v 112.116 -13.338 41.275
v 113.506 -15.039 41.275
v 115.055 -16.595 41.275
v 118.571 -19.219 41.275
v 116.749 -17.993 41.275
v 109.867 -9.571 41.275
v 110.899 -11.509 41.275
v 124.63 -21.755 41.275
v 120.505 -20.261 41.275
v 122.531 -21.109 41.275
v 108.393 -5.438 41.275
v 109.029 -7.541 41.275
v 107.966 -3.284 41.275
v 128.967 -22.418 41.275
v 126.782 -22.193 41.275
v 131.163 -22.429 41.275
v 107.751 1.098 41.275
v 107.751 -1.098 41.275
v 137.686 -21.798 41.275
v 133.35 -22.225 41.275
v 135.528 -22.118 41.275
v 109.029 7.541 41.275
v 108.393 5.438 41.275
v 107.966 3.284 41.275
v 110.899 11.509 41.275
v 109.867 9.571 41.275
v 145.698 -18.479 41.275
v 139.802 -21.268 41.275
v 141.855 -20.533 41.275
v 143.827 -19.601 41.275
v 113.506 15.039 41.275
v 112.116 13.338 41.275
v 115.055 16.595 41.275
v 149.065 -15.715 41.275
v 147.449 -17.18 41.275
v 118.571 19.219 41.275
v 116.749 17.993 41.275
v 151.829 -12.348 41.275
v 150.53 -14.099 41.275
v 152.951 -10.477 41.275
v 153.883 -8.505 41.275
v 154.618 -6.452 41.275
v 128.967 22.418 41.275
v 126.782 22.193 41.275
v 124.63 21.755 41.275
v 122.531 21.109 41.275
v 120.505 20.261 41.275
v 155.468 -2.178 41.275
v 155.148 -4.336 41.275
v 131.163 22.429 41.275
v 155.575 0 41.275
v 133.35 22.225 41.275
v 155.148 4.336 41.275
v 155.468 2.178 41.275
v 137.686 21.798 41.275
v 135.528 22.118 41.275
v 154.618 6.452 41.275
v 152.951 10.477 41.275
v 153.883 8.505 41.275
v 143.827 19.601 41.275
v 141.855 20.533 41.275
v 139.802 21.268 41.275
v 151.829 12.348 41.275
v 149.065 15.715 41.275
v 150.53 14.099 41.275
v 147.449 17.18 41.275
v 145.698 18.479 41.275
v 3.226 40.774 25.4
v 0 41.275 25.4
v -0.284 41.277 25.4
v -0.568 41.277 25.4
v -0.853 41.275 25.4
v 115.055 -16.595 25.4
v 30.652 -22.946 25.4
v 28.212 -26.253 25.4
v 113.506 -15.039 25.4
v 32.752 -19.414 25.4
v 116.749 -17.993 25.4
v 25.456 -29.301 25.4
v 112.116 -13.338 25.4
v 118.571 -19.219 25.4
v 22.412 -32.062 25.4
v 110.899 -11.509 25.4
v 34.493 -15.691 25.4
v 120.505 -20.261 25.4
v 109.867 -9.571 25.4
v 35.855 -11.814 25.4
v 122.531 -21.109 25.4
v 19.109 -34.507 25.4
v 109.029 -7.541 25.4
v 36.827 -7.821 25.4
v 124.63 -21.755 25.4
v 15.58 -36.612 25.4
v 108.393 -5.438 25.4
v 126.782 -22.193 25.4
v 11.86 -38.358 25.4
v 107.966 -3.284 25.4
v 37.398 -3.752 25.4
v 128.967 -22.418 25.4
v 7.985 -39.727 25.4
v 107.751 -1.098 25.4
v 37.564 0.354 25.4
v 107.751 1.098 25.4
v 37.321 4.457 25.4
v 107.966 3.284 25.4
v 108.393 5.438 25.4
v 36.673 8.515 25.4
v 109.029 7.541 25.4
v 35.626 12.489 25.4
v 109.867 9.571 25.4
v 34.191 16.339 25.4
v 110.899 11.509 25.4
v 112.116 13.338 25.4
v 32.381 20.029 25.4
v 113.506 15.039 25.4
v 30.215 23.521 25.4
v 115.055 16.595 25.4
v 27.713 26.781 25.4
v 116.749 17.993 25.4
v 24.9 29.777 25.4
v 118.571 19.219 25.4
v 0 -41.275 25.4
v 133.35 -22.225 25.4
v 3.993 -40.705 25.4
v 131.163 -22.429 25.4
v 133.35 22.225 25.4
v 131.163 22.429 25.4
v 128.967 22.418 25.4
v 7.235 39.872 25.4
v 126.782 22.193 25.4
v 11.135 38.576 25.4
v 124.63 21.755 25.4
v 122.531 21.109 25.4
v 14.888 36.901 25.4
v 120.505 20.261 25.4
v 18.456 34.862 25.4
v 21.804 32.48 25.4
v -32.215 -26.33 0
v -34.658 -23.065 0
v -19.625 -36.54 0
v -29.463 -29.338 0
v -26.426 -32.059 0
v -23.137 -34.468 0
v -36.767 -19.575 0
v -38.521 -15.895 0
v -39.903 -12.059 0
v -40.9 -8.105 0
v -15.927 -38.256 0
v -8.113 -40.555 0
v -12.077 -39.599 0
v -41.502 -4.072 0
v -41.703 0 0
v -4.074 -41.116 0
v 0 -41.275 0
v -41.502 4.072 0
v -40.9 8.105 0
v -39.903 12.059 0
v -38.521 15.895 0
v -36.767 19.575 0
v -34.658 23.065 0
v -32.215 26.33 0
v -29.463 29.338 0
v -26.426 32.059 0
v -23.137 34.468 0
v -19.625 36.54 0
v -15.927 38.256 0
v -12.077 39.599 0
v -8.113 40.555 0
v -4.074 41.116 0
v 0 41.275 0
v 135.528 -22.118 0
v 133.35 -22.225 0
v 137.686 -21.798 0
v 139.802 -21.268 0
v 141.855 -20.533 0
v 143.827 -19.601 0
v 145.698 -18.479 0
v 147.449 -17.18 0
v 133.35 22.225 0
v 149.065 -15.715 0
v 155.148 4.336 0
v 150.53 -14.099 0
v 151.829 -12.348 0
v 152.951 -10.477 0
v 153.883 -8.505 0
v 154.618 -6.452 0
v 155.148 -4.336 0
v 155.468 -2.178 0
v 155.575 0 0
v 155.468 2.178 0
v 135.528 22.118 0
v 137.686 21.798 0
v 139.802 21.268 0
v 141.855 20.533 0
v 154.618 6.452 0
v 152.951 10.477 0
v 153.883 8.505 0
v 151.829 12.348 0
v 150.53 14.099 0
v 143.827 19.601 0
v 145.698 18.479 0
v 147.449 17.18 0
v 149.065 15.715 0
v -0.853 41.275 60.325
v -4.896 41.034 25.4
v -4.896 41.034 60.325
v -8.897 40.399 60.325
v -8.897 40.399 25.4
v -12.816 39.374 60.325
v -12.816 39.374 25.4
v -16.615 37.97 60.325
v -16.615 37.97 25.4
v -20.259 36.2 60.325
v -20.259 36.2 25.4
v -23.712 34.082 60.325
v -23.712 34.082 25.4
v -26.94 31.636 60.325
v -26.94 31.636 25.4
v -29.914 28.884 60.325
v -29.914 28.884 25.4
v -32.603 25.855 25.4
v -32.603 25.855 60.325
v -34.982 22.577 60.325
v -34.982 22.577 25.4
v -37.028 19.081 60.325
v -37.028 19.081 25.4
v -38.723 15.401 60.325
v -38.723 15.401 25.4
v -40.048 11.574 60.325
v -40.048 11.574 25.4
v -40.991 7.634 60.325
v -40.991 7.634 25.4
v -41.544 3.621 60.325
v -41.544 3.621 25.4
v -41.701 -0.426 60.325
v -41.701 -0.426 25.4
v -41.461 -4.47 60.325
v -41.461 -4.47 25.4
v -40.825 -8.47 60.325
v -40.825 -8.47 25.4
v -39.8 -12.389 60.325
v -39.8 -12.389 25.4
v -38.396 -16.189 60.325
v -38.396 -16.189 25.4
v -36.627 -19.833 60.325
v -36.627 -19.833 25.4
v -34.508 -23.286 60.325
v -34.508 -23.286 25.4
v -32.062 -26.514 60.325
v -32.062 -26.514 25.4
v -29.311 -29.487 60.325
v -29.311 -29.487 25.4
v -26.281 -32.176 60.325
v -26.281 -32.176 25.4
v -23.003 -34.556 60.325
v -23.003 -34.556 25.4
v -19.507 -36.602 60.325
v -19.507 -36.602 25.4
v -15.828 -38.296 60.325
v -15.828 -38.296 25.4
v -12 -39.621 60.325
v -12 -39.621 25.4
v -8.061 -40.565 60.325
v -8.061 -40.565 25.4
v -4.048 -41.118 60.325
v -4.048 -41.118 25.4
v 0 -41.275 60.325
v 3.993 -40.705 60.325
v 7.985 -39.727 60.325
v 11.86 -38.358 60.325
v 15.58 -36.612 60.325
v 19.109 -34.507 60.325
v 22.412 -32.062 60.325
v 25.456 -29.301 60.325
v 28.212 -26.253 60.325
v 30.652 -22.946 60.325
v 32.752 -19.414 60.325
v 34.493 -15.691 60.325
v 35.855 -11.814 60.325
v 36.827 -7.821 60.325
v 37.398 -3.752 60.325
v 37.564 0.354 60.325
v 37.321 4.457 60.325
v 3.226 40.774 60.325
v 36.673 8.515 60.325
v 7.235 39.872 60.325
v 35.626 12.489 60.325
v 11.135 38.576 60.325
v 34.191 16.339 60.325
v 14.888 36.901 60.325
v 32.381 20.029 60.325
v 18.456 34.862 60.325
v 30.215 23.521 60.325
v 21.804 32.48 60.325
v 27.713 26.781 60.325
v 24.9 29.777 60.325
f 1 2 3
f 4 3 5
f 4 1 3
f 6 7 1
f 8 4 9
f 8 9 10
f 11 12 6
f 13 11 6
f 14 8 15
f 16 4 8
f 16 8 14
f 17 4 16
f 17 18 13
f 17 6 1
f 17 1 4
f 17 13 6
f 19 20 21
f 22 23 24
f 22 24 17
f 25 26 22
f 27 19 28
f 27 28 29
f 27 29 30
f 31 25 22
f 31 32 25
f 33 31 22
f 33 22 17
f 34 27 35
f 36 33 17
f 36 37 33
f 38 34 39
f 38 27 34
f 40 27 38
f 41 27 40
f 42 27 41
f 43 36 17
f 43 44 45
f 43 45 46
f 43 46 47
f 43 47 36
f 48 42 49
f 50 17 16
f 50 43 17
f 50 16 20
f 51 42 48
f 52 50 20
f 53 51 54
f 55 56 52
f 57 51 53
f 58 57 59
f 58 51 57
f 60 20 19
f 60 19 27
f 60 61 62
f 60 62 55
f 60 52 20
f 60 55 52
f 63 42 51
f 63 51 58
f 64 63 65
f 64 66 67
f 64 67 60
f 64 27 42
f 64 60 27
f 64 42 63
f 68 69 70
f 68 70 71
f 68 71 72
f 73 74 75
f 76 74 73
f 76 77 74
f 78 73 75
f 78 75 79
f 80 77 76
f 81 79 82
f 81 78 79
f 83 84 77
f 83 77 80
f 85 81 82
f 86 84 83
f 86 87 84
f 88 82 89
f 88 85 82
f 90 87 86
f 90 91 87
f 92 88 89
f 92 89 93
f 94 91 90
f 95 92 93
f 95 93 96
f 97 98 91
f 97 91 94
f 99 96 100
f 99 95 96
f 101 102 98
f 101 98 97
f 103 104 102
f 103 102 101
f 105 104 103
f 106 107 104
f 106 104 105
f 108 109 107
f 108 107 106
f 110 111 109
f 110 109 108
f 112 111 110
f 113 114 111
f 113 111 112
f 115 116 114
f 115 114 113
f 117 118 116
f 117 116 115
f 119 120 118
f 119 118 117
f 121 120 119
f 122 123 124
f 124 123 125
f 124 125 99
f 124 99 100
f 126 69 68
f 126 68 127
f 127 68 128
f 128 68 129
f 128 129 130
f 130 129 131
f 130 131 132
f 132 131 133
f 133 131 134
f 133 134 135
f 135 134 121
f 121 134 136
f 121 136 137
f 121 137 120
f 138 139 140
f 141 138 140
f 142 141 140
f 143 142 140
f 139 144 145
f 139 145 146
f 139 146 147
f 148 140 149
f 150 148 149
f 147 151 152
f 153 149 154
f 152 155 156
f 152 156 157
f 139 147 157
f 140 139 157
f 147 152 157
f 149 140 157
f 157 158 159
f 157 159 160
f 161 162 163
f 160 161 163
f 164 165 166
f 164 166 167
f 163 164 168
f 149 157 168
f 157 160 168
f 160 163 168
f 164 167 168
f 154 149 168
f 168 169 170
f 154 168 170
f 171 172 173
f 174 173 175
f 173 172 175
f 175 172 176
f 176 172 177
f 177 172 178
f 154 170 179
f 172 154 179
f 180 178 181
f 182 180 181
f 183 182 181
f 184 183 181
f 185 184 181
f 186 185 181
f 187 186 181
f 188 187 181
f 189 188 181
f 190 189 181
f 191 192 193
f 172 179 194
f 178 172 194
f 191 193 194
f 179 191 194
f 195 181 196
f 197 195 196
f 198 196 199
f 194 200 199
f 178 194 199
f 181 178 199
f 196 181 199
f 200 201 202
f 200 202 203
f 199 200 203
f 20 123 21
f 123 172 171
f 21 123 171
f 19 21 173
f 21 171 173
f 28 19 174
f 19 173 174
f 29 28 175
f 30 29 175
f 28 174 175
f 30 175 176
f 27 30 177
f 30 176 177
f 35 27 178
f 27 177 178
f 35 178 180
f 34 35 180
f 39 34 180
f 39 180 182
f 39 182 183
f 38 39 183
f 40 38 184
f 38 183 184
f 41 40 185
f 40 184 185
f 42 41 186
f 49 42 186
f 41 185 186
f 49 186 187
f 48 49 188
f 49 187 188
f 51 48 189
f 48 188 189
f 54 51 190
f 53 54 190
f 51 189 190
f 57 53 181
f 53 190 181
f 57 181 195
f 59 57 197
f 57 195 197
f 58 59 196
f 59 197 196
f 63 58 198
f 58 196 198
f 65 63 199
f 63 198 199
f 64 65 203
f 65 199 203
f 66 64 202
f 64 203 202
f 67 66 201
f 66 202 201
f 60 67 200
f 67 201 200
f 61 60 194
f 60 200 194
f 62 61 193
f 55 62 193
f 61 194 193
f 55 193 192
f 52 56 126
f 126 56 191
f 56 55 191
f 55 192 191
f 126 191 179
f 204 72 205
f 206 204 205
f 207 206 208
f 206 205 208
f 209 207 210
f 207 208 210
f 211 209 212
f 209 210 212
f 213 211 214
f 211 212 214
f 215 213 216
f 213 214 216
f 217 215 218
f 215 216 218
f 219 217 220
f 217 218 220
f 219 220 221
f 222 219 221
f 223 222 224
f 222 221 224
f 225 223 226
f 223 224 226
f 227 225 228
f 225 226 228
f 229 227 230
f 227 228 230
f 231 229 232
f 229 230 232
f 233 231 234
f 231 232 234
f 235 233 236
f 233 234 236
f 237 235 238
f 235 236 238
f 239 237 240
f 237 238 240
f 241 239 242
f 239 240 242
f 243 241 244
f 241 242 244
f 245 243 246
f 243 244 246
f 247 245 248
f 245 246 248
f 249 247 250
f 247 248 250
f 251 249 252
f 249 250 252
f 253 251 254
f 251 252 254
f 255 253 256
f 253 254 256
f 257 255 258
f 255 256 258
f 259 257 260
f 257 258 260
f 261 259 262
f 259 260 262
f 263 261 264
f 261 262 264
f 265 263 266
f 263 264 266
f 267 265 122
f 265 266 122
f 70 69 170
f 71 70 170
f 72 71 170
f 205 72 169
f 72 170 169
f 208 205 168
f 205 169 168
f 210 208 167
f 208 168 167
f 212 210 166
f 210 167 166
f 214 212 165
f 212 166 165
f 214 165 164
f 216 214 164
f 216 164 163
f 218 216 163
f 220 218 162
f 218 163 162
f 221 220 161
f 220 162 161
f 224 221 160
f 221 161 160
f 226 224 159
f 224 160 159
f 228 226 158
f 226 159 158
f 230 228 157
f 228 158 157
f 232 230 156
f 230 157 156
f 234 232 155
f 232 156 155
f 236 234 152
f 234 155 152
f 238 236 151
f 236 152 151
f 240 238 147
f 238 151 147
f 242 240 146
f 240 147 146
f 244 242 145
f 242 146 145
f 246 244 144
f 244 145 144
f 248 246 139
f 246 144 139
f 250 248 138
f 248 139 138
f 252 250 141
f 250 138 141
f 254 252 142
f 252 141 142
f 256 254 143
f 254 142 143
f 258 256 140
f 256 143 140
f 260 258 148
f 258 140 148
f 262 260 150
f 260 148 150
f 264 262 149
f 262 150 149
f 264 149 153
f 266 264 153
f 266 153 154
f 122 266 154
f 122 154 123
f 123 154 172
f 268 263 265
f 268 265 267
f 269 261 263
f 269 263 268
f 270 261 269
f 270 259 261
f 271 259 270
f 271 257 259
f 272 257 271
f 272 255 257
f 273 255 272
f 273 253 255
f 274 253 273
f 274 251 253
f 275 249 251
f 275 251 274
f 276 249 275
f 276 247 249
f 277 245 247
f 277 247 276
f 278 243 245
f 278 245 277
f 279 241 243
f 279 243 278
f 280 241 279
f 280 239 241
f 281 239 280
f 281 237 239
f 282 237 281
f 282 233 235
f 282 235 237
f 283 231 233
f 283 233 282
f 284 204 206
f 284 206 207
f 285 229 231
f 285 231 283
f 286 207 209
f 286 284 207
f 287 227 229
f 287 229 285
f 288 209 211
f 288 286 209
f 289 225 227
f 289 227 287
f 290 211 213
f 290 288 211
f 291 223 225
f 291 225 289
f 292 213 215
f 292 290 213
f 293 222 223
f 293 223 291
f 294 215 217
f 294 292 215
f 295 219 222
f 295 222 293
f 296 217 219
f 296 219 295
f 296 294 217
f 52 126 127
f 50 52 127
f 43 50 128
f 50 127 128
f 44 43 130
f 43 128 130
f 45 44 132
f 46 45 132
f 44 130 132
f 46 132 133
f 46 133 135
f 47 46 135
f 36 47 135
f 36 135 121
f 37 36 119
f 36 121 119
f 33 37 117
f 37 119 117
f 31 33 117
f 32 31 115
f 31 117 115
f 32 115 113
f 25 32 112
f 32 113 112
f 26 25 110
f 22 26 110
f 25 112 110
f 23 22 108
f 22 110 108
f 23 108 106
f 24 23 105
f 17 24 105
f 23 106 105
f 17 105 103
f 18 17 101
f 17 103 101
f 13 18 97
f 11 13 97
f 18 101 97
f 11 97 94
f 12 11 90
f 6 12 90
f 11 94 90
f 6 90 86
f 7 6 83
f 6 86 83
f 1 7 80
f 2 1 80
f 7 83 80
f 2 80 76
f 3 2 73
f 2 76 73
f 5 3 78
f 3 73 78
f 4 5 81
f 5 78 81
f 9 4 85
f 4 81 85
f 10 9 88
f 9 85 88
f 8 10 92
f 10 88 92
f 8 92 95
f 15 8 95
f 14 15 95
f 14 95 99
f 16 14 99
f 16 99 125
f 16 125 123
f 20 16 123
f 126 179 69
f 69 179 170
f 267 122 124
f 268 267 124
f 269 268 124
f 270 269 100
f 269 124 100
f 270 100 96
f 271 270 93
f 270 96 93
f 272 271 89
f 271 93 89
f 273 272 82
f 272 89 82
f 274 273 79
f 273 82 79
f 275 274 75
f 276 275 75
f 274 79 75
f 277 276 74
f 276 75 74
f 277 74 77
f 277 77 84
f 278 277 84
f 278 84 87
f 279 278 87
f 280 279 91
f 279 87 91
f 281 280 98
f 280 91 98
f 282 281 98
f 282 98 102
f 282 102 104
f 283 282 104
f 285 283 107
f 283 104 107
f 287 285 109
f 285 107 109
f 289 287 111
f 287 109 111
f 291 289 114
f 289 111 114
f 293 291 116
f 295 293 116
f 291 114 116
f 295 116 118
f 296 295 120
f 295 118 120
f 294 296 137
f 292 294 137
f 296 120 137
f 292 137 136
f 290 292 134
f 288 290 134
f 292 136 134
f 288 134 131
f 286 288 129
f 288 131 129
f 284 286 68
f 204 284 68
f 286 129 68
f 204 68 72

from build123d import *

# Parameters (mm, degrees)
F2_DEPTH = 25.4
F4_DEPTH = 34.925
F6_DEPTH = 15.875


with BuildPart() as f2:
    # F0 (on Top) → F2 (new body)
    with BuildSketch(Plane.XY):
        with BuildLine():
            Line((133.35, 22.225), (0, 41.275))
            ThreePointArc((0, 41.275), (-41.703462, 0), (0, -41.275))
            Line((0, -41.275), (133.35, -22.225))
            ThreePointArc((133.35, -22.225), (155.575, 0), (133.35, 22.225))
        make_face()
    extrude(amount=F2_DEPTH)

    # F3 (on face) → F4 (join)
    with BuildSketch(Plane.XY.offset(25.4)):
        with BuildLine():
            ThreePointArc((-0.852523, 41.275), (-41.701261, -0.426261), (0, -41.275))
            Line((0, -41.275), (3.993336, -40.704523))
            ThreePointArc((3.993336, -40.704523), (37.493164, 2.408654), (-0.852523, 41.275))
        make_face()
    extrude(amount=F4_DEPTH)

    # F5 (on face) → F6 (join)
    with BuildSketch(Plane.XY.offset(25.4)):
        with BuildLine():
            ThreePointArc((133.35, -22.225), (155.575, 0), (133.35, 22.225))
            ThreePointArc((133.35, 22.225), (107.72436, 0), (133.35, -22.225))
        make_face()
    extrude(amount=F6_DEPTH)


solid = f2.part
